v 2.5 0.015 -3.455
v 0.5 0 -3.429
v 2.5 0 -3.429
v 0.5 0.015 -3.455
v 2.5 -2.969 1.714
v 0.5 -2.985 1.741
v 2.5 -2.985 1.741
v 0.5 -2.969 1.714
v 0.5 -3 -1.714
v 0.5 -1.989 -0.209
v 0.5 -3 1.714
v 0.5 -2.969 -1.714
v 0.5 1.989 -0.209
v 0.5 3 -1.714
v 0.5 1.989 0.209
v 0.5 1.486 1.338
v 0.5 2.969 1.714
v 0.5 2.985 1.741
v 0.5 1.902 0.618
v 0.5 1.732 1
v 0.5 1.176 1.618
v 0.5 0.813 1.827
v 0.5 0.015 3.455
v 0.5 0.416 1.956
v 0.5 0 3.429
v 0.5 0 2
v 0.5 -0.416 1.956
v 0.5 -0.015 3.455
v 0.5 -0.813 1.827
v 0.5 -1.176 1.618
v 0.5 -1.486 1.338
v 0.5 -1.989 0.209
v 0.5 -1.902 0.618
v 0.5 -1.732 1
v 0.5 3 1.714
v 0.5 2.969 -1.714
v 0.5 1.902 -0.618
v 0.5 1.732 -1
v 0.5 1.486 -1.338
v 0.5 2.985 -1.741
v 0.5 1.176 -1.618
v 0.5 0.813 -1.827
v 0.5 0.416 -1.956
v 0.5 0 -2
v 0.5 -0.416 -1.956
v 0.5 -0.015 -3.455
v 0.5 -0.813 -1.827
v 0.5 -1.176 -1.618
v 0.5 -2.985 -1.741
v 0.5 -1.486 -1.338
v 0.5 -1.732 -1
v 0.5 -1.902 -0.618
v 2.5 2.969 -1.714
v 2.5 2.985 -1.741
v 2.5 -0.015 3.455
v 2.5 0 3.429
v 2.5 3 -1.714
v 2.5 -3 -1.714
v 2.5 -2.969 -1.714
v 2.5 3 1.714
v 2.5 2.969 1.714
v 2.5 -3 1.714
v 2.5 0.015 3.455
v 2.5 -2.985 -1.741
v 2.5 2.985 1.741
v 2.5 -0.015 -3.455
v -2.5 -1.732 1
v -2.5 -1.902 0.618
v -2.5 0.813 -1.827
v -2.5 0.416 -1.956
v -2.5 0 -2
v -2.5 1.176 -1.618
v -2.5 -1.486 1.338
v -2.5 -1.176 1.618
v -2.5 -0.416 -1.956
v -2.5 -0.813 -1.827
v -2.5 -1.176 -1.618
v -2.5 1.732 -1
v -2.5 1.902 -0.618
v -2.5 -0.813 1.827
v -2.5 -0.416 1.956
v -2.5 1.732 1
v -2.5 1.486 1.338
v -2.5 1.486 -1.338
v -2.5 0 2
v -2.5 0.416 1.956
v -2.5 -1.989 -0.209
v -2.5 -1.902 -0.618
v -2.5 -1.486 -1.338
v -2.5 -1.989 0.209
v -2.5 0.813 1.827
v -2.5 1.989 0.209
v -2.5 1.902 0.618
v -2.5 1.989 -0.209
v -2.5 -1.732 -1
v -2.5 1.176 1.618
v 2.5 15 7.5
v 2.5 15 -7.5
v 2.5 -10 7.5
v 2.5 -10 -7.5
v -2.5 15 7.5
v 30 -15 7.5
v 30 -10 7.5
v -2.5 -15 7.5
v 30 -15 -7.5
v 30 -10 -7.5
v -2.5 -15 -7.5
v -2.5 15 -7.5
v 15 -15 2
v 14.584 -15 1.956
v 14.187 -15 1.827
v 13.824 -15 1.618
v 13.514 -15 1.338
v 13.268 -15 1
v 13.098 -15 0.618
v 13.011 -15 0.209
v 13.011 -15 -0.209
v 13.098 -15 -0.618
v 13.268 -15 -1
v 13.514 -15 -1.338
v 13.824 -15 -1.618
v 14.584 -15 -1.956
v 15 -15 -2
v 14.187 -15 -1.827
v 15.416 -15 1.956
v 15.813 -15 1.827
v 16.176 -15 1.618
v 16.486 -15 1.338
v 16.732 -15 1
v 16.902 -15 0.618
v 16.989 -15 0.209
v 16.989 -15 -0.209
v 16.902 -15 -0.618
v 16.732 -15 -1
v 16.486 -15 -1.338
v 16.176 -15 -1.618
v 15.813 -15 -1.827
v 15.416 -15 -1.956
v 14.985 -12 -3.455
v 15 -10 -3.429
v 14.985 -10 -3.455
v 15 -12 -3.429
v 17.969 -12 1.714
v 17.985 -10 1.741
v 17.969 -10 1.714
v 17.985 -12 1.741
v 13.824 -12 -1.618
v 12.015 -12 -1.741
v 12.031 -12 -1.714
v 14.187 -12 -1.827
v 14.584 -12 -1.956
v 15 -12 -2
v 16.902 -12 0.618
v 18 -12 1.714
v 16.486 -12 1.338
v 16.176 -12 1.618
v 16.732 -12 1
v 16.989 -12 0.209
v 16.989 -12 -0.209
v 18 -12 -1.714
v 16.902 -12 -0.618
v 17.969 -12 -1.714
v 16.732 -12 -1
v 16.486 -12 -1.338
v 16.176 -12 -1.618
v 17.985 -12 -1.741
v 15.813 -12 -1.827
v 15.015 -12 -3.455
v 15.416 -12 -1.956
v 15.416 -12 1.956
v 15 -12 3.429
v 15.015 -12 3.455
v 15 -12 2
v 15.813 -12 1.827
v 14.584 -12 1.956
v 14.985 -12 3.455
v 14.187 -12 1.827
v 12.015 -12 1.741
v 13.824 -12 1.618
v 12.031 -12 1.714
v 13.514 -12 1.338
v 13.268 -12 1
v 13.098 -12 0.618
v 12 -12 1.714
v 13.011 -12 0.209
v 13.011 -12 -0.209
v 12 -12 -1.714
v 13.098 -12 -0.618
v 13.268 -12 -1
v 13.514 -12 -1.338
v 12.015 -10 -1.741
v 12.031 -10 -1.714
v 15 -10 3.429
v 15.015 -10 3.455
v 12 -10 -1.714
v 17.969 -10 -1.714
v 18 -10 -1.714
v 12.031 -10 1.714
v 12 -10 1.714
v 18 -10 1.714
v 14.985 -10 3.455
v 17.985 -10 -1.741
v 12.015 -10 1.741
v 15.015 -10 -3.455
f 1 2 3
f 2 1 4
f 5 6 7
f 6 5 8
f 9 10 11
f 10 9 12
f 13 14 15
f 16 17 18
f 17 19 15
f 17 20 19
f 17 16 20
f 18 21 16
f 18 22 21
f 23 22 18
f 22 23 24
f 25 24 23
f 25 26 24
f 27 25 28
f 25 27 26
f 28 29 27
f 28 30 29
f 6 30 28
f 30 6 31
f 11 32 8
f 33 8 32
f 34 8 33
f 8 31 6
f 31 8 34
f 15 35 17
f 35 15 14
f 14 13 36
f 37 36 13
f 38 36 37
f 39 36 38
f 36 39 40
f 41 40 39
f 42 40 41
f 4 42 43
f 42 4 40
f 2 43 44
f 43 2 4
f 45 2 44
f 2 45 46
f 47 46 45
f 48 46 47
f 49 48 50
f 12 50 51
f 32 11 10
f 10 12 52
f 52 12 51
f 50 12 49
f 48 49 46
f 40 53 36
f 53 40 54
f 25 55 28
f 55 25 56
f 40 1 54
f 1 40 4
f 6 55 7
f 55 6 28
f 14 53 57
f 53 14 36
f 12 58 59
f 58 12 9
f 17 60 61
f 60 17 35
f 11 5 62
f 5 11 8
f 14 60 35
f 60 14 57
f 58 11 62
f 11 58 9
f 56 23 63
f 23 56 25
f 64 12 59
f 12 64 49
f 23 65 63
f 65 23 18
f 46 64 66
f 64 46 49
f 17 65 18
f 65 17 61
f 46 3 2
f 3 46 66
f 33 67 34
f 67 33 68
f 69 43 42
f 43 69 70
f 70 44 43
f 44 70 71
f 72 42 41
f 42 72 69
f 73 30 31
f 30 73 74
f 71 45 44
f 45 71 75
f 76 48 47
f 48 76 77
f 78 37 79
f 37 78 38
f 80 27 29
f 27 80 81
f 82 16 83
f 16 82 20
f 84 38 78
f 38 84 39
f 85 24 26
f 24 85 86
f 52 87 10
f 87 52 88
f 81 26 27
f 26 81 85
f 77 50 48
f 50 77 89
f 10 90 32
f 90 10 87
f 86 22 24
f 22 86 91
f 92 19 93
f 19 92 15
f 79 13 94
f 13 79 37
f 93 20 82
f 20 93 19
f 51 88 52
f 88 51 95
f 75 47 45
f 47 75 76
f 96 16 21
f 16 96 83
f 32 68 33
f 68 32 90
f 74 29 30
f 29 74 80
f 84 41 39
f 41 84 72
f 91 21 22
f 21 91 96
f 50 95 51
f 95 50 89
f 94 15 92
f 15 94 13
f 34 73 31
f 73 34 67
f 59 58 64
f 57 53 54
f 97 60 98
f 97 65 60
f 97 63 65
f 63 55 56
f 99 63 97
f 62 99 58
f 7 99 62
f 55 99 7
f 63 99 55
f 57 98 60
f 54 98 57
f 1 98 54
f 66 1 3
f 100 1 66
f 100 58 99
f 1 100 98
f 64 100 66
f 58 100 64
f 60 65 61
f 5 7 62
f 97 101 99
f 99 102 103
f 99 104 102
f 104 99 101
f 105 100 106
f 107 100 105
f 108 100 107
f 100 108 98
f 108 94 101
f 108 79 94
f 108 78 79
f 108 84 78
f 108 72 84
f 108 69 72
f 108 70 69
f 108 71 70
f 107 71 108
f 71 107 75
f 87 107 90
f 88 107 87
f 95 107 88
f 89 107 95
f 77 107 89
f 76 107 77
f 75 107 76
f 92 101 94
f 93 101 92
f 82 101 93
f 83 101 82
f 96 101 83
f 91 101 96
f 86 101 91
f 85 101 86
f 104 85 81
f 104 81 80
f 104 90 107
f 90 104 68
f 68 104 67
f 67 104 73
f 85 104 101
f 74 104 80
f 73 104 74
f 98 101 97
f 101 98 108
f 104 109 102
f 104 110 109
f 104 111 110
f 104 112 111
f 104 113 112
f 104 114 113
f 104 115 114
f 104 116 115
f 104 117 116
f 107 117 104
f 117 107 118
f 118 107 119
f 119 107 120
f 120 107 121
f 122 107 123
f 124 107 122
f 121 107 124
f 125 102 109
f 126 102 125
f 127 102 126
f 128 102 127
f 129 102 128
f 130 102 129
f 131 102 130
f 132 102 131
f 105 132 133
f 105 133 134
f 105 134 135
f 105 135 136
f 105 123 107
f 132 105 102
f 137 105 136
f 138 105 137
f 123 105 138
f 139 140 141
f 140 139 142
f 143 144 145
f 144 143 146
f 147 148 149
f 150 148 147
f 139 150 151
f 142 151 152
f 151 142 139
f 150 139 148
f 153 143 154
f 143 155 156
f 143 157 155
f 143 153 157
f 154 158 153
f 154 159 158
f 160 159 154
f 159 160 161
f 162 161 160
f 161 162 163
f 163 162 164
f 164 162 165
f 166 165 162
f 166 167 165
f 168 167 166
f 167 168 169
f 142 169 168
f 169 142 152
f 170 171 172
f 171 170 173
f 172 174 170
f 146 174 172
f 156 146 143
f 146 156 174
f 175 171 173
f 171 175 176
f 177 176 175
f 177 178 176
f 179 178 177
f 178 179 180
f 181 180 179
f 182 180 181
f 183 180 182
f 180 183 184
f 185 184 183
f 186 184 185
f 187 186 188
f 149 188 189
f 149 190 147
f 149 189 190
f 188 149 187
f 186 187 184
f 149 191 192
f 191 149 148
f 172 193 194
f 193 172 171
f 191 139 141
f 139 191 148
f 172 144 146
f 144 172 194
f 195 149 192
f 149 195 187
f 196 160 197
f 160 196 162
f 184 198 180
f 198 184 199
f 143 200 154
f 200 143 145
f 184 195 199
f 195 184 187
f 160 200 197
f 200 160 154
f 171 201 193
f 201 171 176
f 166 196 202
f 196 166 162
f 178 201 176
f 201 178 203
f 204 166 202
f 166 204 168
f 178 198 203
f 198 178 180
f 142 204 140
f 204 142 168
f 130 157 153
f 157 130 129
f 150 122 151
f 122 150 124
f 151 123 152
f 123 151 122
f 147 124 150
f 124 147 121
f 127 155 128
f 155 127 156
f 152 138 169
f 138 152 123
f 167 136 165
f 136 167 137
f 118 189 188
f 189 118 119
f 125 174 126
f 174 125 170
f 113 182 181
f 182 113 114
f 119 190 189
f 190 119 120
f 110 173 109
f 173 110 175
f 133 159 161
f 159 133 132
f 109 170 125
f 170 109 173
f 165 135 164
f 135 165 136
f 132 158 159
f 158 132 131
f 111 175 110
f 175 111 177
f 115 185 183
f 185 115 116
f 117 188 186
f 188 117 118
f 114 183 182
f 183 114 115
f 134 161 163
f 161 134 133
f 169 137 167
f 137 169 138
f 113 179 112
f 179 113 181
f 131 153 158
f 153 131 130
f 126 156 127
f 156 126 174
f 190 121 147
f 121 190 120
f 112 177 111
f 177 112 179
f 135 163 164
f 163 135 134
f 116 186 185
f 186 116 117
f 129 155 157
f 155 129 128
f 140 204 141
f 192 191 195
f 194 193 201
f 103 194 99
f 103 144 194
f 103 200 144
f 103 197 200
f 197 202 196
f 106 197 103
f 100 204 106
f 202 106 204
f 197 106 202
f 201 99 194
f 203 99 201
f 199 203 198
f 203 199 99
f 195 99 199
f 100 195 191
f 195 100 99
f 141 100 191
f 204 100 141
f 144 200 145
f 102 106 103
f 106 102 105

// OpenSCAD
//Socket wrench (customizable)
//Mateo Marquez
//November 3rd, 2014

// resolution of model
$fs=0.1;

// size of drive hex nut (diameter)
nut_size = 6;
// size of bolt (diameter)
bolt_size = 2;

//Main
side_one(nut_size);
translate([15,-12.5,0]) {
	rotate([0, 0, 90]) {
		side_two(nut_size);
	}
}


//Side Number One
module side_one(nut_size) {
	difference(){
		cube([5, 30, 15], center = true);	
		translate([2.5,0,0]) {
			difference(){
				rotate([0, 90, 0]) {
					hexagon(nut_size, 4);
					bolt(bolt_size);
				}
			}
		}
	}
}

//Side Number Two
module side_two(nut_size) {
	difference(){
		cube([5, 30, 15], center = true);	
		translate([2.5,0,0]) {
			difference(){
				rotate([0, 90, 0]) {
					hexagon(nut_size, 4);
					bolt(bolt_size);
				}
			}
		}
	}
}


//Bolt
module bolt(bolt_size){
	rotate([0, 0, 0]) {
		cylinder(r=bolt_size, h=20, center = true);
	}
}

//Hexagon
module hexagon(size, height) {
  boxWidth = size/1.75;
  for (r = [-60, 0, 60]) rotate([0,0,r]) cube([boxWidth, size, height], true);
}
